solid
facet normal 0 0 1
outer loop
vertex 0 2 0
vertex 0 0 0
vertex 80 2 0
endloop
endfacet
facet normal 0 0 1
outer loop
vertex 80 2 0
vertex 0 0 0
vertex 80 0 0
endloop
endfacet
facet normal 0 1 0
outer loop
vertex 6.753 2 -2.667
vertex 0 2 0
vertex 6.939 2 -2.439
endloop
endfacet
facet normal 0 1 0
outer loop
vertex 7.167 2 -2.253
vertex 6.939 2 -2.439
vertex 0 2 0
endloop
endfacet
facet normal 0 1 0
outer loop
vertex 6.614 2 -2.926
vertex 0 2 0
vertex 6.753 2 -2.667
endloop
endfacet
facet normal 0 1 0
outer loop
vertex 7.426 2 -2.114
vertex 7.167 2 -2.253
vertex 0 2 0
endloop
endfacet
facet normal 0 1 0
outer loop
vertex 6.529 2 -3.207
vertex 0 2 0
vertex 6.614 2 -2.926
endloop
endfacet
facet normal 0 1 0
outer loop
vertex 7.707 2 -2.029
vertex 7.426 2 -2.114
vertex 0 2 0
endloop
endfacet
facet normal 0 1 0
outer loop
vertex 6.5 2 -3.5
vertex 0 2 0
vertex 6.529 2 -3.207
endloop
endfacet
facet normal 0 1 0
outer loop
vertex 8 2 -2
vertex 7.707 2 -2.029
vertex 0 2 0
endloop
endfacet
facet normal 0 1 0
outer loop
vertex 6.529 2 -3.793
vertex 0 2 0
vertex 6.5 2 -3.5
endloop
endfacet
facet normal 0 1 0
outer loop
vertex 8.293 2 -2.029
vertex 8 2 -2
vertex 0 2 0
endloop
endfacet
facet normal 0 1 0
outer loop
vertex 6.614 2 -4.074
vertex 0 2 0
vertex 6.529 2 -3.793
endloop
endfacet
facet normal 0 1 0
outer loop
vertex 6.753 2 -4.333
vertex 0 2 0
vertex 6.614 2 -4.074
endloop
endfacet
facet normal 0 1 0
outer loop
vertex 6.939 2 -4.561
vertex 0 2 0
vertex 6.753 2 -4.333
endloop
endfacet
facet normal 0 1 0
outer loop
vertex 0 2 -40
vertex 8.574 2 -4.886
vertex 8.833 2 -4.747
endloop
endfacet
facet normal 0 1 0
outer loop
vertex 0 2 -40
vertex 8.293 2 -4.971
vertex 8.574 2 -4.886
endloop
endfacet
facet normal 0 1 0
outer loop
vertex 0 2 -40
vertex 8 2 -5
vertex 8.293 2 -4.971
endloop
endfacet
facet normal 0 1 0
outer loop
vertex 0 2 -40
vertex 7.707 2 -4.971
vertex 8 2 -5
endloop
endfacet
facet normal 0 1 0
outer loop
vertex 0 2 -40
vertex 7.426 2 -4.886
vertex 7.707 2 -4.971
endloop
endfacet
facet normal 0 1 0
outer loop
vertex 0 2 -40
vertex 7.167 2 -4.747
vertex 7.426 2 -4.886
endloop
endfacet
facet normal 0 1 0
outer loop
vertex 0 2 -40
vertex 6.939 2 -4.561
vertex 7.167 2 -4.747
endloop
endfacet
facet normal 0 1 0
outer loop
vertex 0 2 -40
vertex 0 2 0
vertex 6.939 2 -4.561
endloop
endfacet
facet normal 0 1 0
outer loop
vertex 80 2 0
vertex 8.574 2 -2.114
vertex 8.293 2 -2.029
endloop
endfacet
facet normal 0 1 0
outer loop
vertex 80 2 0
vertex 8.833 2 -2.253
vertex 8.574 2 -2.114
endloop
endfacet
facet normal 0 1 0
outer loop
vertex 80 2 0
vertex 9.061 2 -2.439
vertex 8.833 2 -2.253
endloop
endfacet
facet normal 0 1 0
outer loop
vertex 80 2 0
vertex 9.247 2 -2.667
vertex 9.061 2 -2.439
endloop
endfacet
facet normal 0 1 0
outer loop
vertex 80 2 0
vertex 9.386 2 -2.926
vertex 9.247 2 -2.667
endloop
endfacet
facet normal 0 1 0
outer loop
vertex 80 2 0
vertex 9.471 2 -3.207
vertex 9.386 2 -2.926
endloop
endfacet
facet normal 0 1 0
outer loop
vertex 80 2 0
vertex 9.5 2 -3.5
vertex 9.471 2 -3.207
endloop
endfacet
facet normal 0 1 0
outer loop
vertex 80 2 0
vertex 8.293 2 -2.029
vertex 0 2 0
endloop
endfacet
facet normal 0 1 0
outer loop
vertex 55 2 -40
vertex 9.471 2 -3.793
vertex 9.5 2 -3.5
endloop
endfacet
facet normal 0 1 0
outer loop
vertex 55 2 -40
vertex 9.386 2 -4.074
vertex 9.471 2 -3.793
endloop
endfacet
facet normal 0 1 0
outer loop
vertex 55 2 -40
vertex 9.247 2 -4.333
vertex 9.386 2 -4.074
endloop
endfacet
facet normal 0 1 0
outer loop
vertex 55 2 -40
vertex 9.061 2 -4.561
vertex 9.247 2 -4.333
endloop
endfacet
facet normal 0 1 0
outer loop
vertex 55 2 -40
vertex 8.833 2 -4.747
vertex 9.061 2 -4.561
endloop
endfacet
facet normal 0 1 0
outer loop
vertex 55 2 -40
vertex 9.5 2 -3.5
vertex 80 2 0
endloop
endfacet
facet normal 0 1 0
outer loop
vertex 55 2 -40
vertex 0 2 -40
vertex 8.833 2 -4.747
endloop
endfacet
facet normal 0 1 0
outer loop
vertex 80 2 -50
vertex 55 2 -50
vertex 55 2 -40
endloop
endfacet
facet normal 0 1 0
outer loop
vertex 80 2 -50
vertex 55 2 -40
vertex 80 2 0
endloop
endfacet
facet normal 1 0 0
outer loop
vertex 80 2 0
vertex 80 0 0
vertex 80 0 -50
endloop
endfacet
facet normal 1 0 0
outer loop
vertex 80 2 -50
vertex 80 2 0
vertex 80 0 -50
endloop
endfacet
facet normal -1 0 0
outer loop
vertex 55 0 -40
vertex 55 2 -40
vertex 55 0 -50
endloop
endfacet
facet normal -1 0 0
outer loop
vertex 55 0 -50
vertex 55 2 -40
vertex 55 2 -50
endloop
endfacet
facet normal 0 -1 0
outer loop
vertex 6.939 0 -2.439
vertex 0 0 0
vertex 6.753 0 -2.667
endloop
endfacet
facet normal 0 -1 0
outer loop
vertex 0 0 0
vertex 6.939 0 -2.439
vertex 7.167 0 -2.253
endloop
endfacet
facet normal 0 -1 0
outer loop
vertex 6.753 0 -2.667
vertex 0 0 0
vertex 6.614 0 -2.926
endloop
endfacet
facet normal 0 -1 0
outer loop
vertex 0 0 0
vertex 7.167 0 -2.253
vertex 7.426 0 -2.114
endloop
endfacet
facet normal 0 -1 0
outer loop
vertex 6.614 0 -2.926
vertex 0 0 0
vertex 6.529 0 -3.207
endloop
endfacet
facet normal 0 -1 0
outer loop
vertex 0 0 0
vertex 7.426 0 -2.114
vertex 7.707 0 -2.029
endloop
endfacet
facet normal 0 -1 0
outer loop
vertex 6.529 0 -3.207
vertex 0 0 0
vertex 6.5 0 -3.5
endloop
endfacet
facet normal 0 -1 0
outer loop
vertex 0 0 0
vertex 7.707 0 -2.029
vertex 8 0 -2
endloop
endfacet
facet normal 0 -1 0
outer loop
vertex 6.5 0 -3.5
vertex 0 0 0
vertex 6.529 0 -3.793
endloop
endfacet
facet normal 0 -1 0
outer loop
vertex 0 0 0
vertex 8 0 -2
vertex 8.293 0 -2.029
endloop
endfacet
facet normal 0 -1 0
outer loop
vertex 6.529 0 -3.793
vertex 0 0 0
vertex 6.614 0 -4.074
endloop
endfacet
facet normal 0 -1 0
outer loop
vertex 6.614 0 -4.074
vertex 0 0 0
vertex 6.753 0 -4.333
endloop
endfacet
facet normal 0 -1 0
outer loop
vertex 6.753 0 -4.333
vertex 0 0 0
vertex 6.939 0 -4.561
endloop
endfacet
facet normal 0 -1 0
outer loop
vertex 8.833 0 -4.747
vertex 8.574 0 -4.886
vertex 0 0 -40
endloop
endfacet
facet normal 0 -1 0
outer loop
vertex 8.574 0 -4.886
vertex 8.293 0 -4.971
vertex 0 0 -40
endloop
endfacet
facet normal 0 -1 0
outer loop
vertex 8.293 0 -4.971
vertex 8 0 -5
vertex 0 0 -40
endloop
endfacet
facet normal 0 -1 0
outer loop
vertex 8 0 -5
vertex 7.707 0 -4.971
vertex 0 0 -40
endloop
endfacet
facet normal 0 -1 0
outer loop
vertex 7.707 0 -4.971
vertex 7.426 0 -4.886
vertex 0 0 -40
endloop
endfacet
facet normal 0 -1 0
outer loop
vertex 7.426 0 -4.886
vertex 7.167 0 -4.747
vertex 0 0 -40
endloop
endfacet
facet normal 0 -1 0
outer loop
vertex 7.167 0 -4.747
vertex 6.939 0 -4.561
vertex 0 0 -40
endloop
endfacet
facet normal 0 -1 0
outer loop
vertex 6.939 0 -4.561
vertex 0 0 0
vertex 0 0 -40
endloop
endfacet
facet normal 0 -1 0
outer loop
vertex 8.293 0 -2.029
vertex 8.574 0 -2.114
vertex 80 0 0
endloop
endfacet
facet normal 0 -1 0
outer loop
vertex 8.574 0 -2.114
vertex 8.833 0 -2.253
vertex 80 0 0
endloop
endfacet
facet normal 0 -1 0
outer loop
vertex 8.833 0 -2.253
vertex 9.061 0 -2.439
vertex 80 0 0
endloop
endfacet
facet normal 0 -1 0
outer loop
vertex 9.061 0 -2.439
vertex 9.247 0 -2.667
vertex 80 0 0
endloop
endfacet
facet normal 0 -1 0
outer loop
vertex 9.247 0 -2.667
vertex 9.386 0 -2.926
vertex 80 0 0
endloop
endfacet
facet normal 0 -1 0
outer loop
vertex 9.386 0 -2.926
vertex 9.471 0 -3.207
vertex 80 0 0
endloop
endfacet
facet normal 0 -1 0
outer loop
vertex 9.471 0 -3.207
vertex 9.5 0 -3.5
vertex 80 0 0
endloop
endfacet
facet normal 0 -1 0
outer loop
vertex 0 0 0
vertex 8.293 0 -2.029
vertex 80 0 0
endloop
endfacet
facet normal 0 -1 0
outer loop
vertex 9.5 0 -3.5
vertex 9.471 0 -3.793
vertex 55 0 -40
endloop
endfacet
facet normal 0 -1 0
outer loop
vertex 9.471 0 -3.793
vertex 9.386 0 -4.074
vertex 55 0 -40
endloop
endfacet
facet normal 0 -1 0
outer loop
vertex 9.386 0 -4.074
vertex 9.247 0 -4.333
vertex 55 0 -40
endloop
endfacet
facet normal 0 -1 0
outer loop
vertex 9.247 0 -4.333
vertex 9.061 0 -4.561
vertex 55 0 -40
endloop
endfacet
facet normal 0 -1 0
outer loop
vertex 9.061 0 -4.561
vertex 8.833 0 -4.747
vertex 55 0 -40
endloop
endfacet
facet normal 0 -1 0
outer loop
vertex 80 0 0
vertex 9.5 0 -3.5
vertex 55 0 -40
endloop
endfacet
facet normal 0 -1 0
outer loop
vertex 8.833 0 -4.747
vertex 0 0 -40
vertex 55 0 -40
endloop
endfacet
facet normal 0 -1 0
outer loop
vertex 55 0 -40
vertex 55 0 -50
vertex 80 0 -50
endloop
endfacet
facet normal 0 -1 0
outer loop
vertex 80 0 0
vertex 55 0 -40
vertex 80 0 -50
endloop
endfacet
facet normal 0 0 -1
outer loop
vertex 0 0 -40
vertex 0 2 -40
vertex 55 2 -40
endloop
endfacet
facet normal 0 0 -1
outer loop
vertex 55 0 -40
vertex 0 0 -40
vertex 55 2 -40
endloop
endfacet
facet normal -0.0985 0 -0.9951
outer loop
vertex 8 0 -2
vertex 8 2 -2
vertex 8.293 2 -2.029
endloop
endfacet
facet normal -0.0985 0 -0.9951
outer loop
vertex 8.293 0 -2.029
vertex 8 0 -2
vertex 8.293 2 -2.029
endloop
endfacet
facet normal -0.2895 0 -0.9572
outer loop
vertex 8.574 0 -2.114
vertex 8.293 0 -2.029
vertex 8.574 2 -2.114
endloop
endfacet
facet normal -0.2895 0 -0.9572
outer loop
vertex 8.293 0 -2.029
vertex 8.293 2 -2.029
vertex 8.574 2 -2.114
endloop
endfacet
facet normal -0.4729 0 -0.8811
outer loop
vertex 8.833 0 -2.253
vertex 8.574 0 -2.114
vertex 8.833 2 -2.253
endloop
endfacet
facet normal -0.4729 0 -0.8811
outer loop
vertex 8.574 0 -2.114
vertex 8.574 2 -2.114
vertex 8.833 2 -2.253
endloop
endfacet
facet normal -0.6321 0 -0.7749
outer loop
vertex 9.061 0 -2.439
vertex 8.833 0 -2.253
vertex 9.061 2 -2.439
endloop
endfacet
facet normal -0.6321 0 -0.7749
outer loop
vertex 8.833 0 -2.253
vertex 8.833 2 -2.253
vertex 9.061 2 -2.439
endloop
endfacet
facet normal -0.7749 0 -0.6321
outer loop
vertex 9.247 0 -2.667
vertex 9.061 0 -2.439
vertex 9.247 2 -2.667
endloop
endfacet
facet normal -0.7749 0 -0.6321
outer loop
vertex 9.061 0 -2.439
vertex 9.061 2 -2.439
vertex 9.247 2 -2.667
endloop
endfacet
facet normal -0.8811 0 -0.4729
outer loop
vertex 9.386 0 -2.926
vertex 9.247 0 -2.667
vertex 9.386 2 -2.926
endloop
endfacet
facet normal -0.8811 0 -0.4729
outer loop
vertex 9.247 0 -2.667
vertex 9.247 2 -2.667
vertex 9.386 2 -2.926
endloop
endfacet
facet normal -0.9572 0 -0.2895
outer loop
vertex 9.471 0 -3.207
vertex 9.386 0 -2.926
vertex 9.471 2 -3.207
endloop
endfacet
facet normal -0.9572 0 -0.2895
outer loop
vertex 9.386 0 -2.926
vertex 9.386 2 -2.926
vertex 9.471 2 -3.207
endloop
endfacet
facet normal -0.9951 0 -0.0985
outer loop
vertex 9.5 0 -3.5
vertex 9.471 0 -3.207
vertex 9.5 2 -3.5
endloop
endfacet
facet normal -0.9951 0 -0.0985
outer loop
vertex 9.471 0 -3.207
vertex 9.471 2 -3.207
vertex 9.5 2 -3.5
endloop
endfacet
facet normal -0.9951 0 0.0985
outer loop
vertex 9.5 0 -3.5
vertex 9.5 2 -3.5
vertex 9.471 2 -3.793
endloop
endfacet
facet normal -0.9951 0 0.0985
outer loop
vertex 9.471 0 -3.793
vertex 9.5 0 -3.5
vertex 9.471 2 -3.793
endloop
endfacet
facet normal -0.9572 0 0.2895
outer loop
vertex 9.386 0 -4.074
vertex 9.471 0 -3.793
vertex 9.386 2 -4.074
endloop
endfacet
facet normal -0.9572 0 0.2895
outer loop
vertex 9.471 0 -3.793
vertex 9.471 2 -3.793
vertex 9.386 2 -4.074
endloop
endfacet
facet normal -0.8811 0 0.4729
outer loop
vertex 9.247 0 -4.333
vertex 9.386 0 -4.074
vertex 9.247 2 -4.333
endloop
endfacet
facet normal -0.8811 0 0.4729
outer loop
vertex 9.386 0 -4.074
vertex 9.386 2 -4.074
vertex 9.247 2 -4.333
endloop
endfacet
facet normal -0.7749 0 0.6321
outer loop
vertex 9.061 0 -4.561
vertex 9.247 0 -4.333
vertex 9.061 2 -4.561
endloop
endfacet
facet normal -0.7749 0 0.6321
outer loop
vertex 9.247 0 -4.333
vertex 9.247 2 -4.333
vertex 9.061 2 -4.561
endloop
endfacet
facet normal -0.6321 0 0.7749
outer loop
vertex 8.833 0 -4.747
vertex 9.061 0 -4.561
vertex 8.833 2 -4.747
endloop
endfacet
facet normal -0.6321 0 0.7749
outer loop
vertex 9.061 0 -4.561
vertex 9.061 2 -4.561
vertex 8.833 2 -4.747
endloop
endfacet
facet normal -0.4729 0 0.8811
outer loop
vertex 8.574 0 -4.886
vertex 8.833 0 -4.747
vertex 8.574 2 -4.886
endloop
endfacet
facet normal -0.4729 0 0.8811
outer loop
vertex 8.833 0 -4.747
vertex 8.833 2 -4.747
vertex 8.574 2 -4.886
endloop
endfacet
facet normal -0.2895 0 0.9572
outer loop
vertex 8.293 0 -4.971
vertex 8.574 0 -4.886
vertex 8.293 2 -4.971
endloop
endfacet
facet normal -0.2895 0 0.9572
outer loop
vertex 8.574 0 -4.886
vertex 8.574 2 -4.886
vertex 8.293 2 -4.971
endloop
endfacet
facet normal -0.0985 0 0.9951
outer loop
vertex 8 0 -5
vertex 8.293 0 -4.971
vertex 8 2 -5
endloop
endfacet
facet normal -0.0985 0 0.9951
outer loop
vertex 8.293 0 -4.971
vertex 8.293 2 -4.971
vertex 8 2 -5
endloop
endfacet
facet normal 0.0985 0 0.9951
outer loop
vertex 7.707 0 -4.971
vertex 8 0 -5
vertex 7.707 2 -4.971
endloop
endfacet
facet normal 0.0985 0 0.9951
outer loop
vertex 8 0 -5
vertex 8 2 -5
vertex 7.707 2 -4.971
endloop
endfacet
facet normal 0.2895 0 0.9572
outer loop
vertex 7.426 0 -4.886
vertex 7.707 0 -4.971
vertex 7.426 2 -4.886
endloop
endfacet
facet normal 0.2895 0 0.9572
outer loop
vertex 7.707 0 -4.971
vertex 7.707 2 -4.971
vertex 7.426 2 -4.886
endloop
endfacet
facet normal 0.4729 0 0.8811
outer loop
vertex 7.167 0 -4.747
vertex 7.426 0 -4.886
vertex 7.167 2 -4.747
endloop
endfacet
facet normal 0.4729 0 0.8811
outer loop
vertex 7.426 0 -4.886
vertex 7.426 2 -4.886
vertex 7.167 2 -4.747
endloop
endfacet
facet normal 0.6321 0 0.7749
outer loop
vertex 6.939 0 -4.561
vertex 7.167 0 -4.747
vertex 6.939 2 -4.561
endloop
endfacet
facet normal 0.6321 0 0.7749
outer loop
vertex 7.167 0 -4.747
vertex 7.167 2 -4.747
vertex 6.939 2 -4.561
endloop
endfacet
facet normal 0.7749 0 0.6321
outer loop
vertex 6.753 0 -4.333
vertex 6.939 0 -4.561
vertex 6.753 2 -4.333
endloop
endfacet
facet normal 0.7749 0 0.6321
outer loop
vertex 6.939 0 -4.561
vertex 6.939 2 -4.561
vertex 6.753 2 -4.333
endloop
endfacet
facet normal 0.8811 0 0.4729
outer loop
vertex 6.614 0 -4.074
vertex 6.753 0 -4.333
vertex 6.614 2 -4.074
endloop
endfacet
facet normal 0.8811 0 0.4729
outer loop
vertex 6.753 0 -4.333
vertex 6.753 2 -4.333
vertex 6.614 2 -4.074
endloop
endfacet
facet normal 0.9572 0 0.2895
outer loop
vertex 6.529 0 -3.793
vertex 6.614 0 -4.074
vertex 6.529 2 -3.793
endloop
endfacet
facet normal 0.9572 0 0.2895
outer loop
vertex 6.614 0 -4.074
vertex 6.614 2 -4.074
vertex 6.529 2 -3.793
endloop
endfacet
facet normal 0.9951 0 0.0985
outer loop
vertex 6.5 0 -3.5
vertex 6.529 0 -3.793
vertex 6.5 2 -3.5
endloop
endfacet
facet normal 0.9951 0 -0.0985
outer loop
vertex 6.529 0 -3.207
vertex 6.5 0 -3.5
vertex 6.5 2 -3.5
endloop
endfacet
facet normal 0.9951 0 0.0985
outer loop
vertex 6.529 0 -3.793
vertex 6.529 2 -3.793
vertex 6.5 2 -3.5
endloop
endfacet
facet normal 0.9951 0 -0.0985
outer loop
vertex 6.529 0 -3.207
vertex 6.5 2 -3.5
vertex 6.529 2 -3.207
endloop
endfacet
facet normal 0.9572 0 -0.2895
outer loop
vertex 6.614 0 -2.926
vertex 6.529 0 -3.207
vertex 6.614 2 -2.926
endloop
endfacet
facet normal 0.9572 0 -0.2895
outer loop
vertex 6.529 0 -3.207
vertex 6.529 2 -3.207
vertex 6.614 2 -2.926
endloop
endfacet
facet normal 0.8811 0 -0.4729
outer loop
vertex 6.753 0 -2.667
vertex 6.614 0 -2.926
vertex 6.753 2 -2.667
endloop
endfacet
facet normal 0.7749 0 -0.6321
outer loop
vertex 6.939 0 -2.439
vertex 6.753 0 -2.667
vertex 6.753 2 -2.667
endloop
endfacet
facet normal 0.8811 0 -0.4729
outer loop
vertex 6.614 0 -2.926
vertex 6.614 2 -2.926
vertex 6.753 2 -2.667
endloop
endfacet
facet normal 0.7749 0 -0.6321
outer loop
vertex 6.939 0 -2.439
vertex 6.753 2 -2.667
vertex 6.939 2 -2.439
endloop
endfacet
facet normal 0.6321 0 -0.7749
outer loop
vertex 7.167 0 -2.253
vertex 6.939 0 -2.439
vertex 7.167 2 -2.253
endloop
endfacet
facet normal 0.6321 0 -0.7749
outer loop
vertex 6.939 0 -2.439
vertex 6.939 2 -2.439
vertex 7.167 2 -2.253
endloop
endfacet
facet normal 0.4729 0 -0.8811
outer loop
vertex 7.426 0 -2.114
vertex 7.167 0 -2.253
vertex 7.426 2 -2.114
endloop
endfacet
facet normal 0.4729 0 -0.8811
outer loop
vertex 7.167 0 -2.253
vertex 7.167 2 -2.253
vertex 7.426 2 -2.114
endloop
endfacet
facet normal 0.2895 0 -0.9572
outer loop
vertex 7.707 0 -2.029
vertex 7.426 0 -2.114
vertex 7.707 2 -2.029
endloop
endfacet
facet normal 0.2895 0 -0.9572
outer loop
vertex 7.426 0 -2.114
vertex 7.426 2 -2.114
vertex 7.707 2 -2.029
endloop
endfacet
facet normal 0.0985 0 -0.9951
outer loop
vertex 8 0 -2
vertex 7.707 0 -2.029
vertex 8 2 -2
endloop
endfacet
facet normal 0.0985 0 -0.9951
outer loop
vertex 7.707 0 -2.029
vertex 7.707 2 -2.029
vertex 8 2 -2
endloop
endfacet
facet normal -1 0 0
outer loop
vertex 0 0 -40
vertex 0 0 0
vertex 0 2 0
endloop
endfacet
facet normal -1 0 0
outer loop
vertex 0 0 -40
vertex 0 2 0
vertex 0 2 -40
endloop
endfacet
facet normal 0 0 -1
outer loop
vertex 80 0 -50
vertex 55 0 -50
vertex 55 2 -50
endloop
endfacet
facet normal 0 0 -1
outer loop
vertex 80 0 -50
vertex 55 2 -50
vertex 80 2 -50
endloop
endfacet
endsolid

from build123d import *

# Parameters (mm, degrees)
SKETCH1_W           = 80
SKETCH1_H           = 50
BOSS_EXTRUDE1_DEPTH = 2
SKETCH2_R           = 1.5
CUT_EXTRUDE1_DEPTH  = 2
SKETCH3_W           = 55
SKETCH3_H           = 10
CUT_EXTRUDE2_DEPTH  = 95.361008897


with BuildPart() as part:
    # Sketch1 → Boss-Extrude1 (new body)
    with BuildSketch(Plane(origin=(0, 0, 0), x_dir=(1, 0, 0), z_dir=(0, 1, 0))):
        with Locations((40, 25)):
            Rectangle(SKETCH1_W, SKETCH1_H)
    extrude(amount=BOSS_EXTRUDE1_DEPTH)

    # Sketch2 → Cut-Extrude1 (cut)
    with BuildSketch(Plane(origin=(0, 2, 0), x_dir=(1, 0, 0), z_dir=(0, 1, 0))):
        with Locations(Location((8, 3.5, 0), (0, 0, 270))):
            Circle(SKETCH2_R)
    extrude(amount=-CUT_EXTRUDE1_DEPTH, mode=Mode.SUBTRACT)

    # Sketch3 → Cut-Extrude2 (cut, through all)
    with BuildSketch(Plane(origin=(0, 2, 0), x_dir=(1, 0, 0), z_dir=(0, 1, 0))):
        with Locations((27.5, 45)):
            Rectangle(SKETCH3_W, SKETCH3_H)
    extrude(amount=-CUT_EXTRUDE2_DEPTH, mode=Mode.SUBTRACT)


solid = part.part
